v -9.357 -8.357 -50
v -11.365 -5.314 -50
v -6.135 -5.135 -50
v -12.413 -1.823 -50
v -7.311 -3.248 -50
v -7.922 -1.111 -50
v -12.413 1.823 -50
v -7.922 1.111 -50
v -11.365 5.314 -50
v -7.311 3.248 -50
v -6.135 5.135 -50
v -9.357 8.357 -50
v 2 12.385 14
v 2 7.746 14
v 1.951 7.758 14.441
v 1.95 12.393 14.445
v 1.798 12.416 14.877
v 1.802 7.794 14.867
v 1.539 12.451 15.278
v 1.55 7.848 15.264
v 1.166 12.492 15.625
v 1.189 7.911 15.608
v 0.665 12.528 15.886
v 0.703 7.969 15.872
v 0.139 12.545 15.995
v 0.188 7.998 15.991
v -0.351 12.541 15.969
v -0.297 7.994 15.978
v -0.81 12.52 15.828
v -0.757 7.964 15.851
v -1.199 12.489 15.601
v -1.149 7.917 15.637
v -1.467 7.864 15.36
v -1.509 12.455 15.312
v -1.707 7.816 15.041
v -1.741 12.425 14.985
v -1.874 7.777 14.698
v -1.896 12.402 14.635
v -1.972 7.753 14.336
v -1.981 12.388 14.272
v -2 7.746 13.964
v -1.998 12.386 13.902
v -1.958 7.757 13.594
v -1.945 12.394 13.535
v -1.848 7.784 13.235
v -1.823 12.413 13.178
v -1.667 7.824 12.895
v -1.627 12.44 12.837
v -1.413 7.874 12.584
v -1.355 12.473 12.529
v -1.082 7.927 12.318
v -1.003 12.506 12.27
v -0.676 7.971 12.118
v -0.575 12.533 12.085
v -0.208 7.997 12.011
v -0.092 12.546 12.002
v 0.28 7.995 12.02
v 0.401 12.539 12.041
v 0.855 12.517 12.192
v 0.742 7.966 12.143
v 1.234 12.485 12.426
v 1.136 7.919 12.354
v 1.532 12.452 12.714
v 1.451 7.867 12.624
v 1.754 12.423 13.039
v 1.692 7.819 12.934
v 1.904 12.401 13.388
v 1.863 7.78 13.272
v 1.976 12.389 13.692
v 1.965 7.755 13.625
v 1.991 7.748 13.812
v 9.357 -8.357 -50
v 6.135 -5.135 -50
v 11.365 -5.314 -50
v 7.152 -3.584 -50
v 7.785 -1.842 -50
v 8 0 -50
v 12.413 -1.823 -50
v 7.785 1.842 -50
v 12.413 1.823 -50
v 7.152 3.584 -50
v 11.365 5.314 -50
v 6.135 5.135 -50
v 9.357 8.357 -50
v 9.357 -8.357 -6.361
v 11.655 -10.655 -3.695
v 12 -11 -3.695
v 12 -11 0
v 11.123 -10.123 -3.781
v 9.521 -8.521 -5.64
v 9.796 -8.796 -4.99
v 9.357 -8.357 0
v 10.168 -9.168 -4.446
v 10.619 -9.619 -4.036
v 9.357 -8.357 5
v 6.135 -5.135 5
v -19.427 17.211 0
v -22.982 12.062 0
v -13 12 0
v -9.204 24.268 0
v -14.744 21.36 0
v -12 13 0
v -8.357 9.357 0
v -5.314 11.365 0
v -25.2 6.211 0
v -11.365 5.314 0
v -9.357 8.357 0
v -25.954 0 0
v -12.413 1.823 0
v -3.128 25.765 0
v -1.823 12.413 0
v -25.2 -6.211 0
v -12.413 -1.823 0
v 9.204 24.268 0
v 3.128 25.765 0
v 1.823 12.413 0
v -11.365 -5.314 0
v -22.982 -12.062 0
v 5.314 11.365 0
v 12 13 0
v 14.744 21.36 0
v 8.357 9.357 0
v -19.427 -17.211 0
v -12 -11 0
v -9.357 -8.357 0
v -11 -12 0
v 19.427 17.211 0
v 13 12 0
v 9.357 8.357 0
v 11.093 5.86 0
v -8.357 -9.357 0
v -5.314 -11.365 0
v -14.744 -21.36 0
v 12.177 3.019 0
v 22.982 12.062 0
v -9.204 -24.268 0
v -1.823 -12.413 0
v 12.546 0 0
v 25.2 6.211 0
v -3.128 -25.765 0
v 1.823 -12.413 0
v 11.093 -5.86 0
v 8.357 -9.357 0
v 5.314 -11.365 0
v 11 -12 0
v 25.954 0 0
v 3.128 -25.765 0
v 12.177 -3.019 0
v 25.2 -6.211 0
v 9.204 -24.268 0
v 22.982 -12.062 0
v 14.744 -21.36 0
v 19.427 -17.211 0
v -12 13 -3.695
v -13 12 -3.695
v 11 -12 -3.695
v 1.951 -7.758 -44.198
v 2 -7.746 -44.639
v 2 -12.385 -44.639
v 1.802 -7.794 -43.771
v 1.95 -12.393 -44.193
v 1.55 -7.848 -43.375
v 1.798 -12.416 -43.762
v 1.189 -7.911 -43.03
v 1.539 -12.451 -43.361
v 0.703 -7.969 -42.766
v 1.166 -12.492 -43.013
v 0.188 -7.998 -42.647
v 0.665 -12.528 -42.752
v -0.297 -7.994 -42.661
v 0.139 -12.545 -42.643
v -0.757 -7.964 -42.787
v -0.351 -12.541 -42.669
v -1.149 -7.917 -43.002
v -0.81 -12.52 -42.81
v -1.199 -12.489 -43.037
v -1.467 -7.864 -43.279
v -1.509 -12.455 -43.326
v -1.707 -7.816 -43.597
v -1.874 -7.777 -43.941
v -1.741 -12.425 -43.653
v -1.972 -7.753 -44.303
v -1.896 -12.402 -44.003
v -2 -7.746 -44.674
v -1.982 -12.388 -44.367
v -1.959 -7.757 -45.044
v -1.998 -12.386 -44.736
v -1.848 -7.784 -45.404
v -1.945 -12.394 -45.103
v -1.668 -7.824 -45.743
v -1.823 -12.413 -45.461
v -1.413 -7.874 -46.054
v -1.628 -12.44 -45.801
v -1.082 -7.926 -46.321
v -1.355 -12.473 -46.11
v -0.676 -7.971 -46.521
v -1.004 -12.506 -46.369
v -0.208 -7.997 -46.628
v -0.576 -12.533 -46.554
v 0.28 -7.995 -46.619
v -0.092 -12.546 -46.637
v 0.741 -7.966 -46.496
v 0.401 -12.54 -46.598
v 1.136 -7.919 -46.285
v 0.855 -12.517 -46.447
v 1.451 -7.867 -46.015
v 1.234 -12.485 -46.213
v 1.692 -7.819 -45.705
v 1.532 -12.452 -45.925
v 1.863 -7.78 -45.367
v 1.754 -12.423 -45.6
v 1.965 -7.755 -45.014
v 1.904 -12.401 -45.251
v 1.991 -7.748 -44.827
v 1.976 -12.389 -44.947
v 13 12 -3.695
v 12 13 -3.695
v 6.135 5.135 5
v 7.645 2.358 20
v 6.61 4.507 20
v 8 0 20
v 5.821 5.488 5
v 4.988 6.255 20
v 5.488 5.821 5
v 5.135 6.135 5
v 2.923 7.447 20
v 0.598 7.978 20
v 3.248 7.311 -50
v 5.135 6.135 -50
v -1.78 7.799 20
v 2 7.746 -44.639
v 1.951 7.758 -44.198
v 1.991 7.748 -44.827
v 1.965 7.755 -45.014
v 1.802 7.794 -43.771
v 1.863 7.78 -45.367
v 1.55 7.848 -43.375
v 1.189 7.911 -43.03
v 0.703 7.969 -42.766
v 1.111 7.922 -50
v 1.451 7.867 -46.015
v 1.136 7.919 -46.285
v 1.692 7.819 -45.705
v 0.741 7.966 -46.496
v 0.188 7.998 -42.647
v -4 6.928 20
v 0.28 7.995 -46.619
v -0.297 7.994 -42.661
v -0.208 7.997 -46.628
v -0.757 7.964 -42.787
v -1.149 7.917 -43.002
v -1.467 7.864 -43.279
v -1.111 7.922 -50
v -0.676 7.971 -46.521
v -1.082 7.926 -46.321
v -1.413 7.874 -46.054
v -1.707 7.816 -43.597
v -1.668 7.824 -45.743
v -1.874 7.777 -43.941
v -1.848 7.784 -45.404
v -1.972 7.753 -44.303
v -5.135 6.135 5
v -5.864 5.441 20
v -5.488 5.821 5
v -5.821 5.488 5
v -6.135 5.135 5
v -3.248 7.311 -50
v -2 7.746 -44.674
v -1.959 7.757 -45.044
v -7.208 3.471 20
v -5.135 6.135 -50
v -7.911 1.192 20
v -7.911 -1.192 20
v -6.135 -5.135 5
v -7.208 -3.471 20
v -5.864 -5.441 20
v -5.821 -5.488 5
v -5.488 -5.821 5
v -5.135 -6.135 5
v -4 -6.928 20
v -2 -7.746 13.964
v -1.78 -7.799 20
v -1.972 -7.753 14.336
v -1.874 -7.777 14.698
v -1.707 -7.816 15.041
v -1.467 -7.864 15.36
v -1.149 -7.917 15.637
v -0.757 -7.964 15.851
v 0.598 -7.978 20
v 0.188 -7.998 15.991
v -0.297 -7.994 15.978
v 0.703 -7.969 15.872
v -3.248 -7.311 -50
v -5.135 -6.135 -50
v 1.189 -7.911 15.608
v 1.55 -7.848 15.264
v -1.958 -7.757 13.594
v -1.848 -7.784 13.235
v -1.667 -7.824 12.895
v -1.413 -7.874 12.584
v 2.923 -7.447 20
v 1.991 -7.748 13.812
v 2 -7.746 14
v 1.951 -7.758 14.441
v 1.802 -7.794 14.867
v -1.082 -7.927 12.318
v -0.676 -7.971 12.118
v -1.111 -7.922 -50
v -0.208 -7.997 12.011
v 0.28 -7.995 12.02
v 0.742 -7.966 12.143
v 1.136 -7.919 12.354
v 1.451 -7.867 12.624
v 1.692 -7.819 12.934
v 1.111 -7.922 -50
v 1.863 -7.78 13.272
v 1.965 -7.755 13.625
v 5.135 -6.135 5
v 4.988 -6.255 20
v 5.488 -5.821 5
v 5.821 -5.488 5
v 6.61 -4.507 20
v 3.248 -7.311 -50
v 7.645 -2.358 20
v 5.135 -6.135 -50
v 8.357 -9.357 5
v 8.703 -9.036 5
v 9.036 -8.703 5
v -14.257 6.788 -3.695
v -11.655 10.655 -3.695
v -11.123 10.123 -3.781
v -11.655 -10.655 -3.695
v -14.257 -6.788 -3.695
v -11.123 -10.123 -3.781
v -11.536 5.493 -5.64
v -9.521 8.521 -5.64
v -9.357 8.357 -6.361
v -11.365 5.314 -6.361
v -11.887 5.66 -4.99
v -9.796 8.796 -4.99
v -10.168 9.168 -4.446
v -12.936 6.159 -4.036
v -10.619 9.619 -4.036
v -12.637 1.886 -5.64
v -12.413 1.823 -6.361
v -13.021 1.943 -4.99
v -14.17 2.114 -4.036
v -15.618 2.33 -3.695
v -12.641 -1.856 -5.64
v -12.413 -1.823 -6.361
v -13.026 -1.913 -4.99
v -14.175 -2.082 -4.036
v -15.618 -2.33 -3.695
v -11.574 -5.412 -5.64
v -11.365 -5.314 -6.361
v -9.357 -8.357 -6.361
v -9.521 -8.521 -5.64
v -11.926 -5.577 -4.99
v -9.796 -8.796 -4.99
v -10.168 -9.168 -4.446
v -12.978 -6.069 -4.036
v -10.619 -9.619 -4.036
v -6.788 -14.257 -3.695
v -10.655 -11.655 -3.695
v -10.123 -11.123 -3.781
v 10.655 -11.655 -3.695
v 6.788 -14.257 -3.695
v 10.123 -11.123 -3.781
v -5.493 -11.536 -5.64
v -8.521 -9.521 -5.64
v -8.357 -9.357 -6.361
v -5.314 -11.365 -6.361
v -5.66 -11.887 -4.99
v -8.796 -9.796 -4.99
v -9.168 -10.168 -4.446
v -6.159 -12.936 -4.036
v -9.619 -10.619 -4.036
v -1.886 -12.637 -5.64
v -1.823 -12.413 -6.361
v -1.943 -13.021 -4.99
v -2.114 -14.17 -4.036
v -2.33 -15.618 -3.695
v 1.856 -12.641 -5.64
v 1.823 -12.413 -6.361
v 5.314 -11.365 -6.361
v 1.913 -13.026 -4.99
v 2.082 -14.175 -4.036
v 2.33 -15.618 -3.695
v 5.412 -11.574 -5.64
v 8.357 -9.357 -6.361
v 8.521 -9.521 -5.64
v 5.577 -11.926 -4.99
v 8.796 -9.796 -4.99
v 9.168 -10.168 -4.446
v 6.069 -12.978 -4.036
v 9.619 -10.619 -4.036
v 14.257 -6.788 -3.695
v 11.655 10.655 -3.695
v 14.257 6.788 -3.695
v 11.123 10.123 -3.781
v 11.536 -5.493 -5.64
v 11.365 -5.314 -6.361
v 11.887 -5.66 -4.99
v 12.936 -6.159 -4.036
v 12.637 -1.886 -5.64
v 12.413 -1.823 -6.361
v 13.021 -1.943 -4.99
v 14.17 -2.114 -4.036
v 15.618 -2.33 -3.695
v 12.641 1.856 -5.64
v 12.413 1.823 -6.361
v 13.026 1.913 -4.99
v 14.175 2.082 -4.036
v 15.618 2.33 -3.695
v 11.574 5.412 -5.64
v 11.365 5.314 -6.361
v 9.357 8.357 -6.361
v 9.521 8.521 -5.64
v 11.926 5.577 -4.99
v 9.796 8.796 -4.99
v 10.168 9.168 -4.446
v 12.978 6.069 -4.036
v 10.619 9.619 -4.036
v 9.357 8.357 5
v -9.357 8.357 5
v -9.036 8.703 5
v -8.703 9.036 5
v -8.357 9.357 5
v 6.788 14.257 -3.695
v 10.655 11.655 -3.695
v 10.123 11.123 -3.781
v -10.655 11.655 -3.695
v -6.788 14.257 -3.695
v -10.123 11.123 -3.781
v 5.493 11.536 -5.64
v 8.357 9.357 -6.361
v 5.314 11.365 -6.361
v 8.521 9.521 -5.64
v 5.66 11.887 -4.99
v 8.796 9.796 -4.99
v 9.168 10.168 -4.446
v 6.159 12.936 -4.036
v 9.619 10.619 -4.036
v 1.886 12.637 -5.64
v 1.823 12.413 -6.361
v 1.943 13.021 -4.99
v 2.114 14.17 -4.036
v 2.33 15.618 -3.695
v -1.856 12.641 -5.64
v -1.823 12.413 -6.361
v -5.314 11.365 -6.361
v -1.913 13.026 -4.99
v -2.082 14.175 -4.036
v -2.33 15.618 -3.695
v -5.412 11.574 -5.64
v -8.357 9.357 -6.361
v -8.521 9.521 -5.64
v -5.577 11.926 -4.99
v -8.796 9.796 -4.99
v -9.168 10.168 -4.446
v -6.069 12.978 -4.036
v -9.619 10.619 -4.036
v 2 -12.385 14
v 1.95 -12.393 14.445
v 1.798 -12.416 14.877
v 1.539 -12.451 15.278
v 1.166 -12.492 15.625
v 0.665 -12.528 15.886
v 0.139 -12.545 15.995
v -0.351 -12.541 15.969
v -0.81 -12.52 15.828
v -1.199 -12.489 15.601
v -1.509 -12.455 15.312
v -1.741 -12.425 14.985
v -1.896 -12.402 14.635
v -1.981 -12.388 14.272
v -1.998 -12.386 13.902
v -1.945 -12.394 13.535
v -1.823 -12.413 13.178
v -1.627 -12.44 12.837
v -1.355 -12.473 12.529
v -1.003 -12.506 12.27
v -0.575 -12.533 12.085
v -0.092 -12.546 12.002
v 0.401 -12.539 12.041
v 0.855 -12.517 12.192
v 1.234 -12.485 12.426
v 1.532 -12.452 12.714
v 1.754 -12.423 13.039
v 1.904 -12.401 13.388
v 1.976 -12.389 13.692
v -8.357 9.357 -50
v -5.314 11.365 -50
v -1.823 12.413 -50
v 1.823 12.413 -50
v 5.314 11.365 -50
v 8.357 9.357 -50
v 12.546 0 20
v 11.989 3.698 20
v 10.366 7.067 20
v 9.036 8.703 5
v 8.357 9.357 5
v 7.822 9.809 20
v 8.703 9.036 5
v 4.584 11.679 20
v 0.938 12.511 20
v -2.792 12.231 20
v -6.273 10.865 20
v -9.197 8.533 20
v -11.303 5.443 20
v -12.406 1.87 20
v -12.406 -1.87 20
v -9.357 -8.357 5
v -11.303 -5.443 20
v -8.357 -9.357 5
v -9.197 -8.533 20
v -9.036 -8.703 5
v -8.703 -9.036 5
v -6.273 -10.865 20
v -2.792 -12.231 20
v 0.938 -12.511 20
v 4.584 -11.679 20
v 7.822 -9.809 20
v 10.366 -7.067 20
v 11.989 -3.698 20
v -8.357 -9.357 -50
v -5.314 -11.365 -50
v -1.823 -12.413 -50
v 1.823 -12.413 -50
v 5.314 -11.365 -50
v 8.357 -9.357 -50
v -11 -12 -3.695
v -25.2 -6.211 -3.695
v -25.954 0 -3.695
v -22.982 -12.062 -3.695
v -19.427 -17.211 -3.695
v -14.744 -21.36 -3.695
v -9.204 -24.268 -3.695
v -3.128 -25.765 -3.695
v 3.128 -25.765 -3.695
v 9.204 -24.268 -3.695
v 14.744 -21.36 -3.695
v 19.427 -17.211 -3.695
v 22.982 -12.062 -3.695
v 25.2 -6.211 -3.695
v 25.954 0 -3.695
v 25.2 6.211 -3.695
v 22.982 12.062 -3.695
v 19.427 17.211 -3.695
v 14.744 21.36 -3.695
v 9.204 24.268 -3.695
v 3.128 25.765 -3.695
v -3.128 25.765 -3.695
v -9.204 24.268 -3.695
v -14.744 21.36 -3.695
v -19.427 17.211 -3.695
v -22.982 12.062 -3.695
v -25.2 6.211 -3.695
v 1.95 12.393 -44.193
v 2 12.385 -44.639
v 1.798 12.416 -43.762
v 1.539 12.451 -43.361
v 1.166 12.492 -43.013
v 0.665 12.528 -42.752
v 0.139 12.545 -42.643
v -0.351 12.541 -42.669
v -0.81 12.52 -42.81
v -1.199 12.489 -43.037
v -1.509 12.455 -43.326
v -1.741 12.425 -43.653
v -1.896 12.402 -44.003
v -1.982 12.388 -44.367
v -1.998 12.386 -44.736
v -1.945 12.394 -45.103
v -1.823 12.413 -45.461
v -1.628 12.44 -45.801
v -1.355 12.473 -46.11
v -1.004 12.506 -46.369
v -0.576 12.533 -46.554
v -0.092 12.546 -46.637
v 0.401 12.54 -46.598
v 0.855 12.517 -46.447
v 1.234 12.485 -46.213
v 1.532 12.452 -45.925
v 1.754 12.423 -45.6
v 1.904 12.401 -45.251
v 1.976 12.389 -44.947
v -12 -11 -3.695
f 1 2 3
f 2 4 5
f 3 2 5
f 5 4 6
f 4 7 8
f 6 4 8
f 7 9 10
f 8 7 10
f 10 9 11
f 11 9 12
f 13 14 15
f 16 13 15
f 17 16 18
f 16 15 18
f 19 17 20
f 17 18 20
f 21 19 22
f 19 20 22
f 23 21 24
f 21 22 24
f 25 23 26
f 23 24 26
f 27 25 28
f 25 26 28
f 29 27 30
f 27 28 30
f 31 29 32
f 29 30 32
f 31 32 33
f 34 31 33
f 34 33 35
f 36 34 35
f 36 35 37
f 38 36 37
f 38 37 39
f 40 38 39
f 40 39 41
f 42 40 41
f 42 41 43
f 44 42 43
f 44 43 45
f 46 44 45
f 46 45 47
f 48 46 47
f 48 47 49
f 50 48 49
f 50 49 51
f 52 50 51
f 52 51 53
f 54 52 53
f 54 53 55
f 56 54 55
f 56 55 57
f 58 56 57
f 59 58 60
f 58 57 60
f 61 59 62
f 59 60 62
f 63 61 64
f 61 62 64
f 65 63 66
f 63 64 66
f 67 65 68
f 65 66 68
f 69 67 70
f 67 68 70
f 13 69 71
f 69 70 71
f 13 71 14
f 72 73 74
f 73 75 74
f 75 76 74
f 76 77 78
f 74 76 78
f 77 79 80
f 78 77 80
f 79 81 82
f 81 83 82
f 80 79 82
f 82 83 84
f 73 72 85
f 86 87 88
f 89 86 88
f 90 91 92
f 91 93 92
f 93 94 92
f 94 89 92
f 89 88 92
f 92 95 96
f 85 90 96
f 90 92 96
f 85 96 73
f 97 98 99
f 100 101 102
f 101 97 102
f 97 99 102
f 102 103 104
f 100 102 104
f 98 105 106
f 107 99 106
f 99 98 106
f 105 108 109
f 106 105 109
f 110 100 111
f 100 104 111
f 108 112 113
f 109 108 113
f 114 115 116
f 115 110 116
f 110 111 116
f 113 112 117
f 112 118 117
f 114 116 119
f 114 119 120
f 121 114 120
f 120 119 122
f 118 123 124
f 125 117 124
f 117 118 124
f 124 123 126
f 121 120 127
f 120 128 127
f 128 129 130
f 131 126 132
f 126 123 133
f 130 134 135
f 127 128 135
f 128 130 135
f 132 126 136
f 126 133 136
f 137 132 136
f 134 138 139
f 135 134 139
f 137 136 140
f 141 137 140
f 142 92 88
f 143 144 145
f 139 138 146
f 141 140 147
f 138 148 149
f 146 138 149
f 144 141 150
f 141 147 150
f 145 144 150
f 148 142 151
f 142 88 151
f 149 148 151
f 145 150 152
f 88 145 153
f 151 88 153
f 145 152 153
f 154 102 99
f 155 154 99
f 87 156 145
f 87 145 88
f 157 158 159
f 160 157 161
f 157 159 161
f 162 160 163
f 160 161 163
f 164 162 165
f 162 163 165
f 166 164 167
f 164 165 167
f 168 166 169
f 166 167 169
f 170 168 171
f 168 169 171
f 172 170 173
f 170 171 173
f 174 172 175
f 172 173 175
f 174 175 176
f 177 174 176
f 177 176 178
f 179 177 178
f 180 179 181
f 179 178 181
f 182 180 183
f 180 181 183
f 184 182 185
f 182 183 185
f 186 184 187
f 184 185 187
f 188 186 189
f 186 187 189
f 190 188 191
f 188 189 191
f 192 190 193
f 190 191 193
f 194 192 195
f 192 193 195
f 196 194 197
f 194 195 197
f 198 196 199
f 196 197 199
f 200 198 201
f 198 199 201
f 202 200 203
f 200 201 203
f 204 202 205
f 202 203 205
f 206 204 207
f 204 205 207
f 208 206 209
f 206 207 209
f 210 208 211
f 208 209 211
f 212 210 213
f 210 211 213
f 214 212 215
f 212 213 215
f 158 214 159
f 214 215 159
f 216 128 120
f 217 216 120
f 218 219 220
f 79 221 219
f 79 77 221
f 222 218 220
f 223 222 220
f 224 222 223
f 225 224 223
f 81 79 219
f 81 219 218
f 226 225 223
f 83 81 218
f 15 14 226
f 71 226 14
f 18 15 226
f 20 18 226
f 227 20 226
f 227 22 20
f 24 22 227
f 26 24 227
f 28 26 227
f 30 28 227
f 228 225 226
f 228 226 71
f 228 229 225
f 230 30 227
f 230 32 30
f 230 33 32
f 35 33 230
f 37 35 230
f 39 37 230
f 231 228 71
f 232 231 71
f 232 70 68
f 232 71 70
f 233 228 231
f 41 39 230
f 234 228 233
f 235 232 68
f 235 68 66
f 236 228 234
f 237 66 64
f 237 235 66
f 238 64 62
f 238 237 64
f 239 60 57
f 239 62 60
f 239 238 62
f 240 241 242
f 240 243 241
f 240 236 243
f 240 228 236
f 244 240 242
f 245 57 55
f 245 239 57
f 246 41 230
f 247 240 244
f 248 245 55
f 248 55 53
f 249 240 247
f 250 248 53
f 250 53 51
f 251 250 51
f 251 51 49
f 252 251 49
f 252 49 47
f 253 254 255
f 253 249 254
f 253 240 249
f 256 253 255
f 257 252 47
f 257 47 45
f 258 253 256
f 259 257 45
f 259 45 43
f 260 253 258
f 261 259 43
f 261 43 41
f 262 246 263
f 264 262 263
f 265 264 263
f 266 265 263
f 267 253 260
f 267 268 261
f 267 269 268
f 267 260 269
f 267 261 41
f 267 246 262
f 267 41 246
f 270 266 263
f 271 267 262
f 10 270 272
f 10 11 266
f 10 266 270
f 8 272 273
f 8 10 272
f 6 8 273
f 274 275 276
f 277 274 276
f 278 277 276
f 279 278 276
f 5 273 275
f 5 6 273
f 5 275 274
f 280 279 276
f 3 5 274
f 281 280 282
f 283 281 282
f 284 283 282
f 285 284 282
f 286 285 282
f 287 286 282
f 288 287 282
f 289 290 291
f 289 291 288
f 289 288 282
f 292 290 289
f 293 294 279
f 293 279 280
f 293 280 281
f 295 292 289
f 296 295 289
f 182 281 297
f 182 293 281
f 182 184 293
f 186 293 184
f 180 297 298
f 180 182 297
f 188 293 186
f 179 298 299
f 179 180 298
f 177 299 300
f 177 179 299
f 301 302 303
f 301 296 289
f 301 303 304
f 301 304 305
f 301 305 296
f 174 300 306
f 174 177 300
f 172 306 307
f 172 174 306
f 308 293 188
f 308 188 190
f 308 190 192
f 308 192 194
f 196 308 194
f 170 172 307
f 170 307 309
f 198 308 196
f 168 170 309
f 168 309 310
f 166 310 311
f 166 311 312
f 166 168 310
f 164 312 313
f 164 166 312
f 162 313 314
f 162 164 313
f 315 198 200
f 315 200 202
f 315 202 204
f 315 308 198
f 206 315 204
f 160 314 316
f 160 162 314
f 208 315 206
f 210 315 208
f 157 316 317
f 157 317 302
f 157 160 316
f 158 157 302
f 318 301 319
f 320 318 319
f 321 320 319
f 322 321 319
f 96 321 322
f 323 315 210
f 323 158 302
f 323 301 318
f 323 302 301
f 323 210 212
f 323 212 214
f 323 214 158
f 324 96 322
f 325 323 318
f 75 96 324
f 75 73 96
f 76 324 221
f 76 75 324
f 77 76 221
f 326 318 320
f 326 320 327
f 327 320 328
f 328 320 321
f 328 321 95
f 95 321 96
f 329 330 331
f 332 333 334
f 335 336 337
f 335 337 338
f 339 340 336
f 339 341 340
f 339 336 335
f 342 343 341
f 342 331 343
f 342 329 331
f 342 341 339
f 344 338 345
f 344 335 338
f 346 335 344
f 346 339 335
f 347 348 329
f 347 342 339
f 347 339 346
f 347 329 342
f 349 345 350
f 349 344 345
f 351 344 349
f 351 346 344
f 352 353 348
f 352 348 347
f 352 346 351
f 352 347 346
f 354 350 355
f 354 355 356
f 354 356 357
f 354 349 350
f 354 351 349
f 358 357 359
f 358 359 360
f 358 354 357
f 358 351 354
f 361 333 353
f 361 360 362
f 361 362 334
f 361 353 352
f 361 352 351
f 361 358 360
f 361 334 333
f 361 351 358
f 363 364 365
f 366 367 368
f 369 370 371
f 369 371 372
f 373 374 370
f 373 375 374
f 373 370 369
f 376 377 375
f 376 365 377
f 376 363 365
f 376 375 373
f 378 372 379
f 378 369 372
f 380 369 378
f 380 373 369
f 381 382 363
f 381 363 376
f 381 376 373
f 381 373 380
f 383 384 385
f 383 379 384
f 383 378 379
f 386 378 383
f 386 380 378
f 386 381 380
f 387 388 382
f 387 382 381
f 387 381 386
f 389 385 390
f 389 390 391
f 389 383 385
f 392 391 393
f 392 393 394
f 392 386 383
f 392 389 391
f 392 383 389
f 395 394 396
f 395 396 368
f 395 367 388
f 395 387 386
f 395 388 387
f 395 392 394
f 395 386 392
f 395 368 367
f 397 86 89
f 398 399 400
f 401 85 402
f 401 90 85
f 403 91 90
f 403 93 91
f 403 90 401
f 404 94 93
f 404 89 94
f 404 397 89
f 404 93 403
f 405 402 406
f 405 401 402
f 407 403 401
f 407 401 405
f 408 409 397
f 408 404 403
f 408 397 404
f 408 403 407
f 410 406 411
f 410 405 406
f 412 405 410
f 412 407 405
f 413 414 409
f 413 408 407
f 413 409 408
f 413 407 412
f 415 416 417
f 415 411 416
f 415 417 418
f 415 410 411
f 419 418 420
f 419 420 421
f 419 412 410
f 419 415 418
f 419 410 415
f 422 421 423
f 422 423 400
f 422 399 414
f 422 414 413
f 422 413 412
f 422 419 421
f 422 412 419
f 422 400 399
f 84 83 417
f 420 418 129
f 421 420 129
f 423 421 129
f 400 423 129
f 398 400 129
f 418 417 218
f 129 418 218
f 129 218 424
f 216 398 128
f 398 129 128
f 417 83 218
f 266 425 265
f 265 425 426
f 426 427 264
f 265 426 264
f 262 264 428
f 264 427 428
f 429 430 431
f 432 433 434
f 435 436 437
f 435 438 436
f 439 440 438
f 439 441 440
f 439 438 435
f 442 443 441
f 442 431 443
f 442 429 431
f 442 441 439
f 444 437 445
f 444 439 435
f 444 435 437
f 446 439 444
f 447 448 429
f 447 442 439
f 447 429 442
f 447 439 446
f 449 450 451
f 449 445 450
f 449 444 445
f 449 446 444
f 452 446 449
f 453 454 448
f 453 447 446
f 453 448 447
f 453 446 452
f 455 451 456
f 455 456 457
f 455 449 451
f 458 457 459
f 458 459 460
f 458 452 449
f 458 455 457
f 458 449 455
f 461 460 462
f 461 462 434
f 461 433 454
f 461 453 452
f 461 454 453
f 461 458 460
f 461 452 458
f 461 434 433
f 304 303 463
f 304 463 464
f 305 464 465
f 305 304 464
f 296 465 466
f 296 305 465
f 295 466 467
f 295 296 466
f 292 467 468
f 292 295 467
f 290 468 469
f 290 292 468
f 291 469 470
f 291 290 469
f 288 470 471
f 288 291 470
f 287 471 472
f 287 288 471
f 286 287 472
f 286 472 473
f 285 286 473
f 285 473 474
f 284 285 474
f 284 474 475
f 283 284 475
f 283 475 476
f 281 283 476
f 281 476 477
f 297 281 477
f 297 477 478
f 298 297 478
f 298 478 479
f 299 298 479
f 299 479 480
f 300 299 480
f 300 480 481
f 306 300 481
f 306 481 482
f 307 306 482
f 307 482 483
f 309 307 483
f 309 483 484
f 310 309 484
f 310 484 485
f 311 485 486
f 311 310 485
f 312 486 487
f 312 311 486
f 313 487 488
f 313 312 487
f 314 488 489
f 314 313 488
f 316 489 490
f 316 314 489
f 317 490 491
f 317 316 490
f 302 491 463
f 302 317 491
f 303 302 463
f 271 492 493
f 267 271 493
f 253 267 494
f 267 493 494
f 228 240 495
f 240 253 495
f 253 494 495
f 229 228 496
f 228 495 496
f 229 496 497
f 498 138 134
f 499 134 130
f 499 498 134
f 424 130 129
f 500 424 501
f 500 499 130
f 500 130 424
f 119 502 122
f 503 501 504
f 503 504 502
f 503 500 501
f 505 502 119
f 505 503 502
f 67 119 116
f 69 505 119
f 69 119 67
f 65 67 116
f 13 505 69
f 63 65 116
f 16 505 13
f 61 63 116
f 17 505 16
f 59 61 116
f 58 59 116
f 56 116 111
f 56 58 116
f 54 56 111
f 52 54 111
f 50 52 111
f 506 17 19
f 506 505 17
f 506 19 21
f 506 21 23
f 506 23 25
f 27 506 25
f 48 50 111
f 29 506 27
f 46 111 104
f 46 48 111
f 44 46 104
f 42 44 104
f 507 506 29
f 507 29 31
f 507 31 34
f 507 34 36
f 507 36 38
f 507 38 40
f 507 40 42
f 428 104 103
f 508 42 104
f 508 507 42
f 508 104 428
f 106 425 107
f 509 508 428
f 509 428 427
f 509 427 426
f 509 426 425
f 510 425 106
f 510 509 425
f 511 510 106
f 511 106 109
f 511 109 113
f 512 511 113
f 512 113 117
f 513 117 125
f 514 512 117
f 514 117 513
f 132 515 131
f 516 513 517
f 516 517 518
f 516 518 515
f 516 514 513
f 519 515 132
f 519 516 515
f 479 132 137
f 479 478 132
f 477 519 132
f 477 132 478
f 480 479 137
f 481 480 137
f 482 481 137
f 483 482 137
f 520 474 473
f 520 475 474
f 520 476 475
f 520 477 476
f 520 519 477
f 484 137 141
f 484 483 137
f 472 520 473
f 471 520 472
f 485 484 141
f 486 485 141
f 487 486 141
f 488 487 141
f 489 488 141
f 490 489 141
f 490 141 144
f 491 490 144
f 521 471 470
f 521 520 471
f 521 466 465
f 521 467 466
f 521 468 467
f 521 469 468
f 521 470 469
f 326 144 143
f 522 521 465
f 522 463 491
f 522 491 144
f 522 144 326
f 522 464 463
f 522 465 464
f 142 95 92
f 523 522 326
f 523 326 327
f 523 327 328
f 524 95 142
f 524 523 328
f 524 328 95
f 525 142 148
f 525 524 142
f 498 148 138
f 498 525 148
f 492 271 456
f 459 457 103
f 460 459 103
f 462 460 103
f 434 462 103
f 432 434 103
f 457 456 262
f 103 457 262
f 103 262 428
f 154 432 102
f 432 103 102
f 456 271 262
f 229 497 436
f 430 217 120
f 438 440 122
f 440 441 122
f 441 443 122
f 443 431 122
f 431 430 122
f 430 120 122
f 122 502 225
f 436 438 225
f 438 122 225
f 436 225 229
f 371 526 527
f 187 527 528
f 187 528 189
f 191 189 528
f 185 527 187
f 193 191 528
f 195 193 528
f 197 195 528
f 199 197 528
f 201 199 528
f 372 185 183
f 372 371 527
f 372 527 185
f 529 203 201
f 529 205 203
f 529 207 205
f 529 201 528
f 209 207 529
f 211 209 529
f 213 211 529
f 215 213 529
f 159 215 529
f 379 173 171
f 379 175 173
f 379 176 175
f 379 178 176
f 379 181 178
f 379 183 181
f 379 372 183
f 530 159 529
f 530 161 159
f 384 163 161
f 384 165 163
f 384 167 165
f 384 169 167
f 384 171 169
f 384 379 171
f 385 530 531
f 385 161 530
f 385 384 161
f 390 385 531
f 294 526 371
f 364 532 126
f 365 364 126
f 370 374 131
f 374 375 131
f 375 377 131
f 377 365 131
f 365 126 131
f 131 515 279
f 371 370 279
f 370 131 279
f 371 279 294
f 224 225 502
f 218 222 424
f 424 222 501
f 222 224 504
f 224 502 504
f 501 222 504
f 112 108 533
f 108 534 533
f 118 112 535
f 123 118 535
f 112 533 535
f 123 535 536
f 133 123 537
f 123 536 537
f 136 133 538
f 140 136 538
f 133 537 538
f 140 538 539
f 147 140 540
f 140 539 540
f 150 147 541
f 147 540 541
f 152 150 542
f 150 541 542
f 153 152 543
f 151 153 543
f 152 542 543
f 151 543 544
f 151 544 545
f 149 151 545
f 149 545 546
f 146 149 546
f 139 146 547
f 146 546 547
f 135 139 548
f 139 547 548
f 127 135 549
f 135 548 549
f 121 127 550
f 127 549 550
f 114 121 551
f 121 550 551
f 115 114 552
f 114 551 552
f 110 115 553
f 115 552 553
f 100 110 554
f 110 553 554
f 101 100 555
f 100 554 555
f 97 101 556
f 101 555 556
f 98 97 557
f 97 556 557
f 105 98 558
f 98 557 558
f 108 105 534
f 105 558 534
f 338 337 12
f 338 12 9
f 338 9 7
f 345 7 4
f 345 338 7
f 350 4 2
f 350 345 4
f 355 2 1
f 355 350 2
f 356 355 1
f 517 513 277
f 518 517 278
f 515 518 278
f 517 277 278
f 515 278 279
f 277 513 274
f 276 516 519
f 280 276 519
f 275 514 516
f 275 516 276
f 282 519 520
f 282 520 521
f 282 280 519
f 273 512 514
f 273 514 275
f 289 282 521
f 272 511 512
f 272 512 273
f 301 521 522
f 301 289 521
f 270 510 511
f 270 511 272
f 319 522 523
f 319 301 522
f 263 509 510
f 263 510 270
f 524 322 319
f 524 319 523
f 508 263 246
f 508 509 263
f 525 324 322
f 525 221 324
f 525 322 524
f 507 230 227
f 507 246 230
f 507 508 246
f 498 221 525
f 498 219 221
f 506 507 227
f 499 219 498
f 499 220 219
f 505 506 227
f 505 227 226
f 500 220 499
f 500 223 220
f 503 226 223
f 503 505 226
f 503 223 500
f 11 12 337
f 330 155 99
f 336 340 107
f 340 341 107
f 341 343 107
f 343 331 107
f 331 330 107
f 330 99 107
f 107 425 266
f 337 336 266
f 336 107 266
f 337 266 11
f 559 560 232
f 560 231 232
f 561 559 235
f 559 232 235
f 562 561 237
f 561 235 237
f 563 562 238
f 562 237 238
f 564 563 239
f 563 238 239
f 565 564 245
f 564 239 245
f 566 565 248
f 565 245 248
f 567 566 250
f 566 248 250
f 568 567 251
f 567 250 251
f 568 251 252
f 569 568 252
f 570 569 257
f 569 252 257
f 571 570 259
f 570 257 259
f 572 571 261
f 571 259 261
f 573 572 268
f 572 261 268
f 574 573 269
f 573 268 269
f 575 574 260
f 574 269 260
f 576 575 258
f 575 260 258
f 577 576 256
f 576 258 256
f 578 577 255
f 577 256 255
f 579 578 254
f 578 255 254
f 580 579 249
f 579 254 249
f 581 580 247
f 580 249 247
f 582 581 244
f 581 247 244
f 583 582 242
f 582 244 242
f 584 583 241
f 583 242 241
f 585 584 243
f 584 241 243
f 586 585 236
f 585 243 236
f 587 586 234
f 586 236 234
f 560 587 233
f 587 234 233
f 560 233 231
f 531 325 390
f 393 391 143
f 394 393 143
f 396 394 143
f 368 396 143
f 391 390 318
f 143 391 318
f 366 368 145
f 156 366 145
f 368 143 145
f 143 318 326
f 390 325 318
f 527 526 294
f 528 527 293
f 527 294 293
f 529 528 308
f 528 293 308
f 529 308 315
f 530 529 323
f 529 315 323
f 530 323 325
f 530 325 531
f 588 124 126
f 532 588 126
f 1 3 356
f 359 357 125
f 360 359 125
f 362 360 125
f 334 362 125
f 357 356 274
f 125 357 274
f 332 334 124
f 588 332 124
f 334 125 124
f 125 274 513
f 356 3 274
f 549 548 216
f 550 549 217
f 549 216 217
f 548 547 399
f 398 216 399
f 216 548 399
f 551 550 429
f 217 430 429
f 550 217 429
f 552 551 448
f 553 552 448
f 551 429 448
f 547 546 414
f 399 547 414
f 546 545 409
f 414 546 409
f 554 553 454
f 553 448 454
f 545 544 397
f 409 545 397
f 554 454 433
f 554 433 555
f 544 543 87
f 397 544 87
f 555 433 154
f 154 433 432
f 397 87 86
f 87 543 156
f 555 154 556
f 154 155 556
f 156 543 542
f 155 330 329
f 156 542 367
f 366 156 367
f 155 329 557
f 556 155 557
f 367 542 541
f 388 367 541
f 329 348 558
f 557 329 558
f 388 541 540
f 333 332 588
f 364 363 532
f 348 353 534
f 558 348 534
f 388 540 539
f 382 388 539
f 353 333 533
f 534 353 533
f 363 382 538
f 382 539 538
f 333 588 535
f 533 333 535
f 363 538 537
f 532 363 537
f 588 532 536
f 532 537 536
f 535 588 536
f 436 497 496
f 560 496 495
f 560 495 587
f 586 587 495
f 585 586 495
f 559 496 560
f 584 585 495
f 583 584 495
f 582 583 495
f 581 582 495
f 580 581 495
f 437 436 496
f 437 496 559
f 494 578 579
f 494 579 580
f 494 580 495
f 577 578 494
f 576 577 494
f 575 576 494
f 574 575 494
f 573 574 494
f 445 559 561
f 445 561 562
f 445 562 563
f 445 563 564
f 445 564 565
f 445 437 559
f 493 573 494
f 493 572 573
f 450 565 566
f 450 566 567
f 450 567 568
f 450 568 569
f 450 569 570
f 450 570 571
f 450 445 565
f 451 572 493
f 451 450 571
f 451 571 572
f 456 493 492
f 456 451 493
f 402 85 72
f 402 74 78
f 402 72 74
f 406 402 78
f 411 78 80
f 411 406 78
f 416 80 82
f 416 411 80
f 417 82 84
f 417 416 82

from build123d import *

# Parameters (mm, degrees)
PAD002_DEPTH      = 5
PAD002_DEPTH_BACK = 100
SKETCH002_R       = 2
SKETCH002_R_2     = 2.000137
PAD001_DEPTH      = 17.5
SKETCH_R          = 12.5459
SKETCH_R_2        = 8
PAD_DEPTH         = 20
PAD_DEPTH_BACK    = 50


with BuildPart() as pad002:
    # Sketch003 → Pad002 (new body, two sides)
    with BuildSketch(Plane.XY) as pad002_sk:
        Polygon((1, 0), (13, 12), (12, 13), (0, 1), (-12, 13), (-13, 12), (-1, 0), (-12, -11), (-11, -12), (0, -1), (11, -12), (12, -11), align=None)
    extrude(amount=PAD002_DEPTH)
    extrude(pad002_sk.sketch, amount=-PAD002_DEPTH_BACK)


with BuildPart() as pad001:
    # Sketch002 → Pad001 (new body, symmetric)
    with BuildSketch(Plane.XZ):
        with Locations((0, 14)):
            Circle(SKETCH002_R)
        with Locations((0, -44.638561)):
            Circle(SKETCH002_R_2)
    extrude(amount=PAD001_DEPTH, both=True)


with BuildPart() as revolution:
    # Sketch001 → Revolution (revolve)
    with BuildSketch(Plane.XZ):
        with BuildLine():
            Line((-10, 0), (-25.954499, 0))
            Line((-25.954499, 0), (-25.954499, -3.694792))
            Line((-25.954499, -3.694792), (-15.790939, -3.694792))
            ThreePointArc((-12.482958, -7.002773), (-13.451843, -4.663677), (-15.790939, -3.694792))
            Line((-12.482958, -7.002773), (-12.482958, -17.250204))
            Line((-12.482958, -17.250204), (-10, -17.250204))
            Line((-10, -17.250204), (-10, 0))
        make_face()
    revolve(axis=Axis((0, 0, 0), (0, 0, 1)))


with BuildPart() as cut001:
    # Sketch → Pad (new body, two sides)
    with BuildSketch(Plane.XY) as pad_sk:
        Circle(SKETCH_R)
        Circle(SKETCH_R_2, mode=Mode.SUBTRACT)
    extrude(amount=PAD_DEPTH)
    extrude(pad_sk.sketch, amount=-PAD_DEPTH_BACK)

    # Fusion: union Revolution
    add(revolution.part)

    # Cut: cut Pad001
    add(pad001.part, mode=Mode.SUBTRACT)

    # Cut001: cut Pad002
    add(pad002.part, mode=Mode.SUBTRACT)


solid = cut001.part
